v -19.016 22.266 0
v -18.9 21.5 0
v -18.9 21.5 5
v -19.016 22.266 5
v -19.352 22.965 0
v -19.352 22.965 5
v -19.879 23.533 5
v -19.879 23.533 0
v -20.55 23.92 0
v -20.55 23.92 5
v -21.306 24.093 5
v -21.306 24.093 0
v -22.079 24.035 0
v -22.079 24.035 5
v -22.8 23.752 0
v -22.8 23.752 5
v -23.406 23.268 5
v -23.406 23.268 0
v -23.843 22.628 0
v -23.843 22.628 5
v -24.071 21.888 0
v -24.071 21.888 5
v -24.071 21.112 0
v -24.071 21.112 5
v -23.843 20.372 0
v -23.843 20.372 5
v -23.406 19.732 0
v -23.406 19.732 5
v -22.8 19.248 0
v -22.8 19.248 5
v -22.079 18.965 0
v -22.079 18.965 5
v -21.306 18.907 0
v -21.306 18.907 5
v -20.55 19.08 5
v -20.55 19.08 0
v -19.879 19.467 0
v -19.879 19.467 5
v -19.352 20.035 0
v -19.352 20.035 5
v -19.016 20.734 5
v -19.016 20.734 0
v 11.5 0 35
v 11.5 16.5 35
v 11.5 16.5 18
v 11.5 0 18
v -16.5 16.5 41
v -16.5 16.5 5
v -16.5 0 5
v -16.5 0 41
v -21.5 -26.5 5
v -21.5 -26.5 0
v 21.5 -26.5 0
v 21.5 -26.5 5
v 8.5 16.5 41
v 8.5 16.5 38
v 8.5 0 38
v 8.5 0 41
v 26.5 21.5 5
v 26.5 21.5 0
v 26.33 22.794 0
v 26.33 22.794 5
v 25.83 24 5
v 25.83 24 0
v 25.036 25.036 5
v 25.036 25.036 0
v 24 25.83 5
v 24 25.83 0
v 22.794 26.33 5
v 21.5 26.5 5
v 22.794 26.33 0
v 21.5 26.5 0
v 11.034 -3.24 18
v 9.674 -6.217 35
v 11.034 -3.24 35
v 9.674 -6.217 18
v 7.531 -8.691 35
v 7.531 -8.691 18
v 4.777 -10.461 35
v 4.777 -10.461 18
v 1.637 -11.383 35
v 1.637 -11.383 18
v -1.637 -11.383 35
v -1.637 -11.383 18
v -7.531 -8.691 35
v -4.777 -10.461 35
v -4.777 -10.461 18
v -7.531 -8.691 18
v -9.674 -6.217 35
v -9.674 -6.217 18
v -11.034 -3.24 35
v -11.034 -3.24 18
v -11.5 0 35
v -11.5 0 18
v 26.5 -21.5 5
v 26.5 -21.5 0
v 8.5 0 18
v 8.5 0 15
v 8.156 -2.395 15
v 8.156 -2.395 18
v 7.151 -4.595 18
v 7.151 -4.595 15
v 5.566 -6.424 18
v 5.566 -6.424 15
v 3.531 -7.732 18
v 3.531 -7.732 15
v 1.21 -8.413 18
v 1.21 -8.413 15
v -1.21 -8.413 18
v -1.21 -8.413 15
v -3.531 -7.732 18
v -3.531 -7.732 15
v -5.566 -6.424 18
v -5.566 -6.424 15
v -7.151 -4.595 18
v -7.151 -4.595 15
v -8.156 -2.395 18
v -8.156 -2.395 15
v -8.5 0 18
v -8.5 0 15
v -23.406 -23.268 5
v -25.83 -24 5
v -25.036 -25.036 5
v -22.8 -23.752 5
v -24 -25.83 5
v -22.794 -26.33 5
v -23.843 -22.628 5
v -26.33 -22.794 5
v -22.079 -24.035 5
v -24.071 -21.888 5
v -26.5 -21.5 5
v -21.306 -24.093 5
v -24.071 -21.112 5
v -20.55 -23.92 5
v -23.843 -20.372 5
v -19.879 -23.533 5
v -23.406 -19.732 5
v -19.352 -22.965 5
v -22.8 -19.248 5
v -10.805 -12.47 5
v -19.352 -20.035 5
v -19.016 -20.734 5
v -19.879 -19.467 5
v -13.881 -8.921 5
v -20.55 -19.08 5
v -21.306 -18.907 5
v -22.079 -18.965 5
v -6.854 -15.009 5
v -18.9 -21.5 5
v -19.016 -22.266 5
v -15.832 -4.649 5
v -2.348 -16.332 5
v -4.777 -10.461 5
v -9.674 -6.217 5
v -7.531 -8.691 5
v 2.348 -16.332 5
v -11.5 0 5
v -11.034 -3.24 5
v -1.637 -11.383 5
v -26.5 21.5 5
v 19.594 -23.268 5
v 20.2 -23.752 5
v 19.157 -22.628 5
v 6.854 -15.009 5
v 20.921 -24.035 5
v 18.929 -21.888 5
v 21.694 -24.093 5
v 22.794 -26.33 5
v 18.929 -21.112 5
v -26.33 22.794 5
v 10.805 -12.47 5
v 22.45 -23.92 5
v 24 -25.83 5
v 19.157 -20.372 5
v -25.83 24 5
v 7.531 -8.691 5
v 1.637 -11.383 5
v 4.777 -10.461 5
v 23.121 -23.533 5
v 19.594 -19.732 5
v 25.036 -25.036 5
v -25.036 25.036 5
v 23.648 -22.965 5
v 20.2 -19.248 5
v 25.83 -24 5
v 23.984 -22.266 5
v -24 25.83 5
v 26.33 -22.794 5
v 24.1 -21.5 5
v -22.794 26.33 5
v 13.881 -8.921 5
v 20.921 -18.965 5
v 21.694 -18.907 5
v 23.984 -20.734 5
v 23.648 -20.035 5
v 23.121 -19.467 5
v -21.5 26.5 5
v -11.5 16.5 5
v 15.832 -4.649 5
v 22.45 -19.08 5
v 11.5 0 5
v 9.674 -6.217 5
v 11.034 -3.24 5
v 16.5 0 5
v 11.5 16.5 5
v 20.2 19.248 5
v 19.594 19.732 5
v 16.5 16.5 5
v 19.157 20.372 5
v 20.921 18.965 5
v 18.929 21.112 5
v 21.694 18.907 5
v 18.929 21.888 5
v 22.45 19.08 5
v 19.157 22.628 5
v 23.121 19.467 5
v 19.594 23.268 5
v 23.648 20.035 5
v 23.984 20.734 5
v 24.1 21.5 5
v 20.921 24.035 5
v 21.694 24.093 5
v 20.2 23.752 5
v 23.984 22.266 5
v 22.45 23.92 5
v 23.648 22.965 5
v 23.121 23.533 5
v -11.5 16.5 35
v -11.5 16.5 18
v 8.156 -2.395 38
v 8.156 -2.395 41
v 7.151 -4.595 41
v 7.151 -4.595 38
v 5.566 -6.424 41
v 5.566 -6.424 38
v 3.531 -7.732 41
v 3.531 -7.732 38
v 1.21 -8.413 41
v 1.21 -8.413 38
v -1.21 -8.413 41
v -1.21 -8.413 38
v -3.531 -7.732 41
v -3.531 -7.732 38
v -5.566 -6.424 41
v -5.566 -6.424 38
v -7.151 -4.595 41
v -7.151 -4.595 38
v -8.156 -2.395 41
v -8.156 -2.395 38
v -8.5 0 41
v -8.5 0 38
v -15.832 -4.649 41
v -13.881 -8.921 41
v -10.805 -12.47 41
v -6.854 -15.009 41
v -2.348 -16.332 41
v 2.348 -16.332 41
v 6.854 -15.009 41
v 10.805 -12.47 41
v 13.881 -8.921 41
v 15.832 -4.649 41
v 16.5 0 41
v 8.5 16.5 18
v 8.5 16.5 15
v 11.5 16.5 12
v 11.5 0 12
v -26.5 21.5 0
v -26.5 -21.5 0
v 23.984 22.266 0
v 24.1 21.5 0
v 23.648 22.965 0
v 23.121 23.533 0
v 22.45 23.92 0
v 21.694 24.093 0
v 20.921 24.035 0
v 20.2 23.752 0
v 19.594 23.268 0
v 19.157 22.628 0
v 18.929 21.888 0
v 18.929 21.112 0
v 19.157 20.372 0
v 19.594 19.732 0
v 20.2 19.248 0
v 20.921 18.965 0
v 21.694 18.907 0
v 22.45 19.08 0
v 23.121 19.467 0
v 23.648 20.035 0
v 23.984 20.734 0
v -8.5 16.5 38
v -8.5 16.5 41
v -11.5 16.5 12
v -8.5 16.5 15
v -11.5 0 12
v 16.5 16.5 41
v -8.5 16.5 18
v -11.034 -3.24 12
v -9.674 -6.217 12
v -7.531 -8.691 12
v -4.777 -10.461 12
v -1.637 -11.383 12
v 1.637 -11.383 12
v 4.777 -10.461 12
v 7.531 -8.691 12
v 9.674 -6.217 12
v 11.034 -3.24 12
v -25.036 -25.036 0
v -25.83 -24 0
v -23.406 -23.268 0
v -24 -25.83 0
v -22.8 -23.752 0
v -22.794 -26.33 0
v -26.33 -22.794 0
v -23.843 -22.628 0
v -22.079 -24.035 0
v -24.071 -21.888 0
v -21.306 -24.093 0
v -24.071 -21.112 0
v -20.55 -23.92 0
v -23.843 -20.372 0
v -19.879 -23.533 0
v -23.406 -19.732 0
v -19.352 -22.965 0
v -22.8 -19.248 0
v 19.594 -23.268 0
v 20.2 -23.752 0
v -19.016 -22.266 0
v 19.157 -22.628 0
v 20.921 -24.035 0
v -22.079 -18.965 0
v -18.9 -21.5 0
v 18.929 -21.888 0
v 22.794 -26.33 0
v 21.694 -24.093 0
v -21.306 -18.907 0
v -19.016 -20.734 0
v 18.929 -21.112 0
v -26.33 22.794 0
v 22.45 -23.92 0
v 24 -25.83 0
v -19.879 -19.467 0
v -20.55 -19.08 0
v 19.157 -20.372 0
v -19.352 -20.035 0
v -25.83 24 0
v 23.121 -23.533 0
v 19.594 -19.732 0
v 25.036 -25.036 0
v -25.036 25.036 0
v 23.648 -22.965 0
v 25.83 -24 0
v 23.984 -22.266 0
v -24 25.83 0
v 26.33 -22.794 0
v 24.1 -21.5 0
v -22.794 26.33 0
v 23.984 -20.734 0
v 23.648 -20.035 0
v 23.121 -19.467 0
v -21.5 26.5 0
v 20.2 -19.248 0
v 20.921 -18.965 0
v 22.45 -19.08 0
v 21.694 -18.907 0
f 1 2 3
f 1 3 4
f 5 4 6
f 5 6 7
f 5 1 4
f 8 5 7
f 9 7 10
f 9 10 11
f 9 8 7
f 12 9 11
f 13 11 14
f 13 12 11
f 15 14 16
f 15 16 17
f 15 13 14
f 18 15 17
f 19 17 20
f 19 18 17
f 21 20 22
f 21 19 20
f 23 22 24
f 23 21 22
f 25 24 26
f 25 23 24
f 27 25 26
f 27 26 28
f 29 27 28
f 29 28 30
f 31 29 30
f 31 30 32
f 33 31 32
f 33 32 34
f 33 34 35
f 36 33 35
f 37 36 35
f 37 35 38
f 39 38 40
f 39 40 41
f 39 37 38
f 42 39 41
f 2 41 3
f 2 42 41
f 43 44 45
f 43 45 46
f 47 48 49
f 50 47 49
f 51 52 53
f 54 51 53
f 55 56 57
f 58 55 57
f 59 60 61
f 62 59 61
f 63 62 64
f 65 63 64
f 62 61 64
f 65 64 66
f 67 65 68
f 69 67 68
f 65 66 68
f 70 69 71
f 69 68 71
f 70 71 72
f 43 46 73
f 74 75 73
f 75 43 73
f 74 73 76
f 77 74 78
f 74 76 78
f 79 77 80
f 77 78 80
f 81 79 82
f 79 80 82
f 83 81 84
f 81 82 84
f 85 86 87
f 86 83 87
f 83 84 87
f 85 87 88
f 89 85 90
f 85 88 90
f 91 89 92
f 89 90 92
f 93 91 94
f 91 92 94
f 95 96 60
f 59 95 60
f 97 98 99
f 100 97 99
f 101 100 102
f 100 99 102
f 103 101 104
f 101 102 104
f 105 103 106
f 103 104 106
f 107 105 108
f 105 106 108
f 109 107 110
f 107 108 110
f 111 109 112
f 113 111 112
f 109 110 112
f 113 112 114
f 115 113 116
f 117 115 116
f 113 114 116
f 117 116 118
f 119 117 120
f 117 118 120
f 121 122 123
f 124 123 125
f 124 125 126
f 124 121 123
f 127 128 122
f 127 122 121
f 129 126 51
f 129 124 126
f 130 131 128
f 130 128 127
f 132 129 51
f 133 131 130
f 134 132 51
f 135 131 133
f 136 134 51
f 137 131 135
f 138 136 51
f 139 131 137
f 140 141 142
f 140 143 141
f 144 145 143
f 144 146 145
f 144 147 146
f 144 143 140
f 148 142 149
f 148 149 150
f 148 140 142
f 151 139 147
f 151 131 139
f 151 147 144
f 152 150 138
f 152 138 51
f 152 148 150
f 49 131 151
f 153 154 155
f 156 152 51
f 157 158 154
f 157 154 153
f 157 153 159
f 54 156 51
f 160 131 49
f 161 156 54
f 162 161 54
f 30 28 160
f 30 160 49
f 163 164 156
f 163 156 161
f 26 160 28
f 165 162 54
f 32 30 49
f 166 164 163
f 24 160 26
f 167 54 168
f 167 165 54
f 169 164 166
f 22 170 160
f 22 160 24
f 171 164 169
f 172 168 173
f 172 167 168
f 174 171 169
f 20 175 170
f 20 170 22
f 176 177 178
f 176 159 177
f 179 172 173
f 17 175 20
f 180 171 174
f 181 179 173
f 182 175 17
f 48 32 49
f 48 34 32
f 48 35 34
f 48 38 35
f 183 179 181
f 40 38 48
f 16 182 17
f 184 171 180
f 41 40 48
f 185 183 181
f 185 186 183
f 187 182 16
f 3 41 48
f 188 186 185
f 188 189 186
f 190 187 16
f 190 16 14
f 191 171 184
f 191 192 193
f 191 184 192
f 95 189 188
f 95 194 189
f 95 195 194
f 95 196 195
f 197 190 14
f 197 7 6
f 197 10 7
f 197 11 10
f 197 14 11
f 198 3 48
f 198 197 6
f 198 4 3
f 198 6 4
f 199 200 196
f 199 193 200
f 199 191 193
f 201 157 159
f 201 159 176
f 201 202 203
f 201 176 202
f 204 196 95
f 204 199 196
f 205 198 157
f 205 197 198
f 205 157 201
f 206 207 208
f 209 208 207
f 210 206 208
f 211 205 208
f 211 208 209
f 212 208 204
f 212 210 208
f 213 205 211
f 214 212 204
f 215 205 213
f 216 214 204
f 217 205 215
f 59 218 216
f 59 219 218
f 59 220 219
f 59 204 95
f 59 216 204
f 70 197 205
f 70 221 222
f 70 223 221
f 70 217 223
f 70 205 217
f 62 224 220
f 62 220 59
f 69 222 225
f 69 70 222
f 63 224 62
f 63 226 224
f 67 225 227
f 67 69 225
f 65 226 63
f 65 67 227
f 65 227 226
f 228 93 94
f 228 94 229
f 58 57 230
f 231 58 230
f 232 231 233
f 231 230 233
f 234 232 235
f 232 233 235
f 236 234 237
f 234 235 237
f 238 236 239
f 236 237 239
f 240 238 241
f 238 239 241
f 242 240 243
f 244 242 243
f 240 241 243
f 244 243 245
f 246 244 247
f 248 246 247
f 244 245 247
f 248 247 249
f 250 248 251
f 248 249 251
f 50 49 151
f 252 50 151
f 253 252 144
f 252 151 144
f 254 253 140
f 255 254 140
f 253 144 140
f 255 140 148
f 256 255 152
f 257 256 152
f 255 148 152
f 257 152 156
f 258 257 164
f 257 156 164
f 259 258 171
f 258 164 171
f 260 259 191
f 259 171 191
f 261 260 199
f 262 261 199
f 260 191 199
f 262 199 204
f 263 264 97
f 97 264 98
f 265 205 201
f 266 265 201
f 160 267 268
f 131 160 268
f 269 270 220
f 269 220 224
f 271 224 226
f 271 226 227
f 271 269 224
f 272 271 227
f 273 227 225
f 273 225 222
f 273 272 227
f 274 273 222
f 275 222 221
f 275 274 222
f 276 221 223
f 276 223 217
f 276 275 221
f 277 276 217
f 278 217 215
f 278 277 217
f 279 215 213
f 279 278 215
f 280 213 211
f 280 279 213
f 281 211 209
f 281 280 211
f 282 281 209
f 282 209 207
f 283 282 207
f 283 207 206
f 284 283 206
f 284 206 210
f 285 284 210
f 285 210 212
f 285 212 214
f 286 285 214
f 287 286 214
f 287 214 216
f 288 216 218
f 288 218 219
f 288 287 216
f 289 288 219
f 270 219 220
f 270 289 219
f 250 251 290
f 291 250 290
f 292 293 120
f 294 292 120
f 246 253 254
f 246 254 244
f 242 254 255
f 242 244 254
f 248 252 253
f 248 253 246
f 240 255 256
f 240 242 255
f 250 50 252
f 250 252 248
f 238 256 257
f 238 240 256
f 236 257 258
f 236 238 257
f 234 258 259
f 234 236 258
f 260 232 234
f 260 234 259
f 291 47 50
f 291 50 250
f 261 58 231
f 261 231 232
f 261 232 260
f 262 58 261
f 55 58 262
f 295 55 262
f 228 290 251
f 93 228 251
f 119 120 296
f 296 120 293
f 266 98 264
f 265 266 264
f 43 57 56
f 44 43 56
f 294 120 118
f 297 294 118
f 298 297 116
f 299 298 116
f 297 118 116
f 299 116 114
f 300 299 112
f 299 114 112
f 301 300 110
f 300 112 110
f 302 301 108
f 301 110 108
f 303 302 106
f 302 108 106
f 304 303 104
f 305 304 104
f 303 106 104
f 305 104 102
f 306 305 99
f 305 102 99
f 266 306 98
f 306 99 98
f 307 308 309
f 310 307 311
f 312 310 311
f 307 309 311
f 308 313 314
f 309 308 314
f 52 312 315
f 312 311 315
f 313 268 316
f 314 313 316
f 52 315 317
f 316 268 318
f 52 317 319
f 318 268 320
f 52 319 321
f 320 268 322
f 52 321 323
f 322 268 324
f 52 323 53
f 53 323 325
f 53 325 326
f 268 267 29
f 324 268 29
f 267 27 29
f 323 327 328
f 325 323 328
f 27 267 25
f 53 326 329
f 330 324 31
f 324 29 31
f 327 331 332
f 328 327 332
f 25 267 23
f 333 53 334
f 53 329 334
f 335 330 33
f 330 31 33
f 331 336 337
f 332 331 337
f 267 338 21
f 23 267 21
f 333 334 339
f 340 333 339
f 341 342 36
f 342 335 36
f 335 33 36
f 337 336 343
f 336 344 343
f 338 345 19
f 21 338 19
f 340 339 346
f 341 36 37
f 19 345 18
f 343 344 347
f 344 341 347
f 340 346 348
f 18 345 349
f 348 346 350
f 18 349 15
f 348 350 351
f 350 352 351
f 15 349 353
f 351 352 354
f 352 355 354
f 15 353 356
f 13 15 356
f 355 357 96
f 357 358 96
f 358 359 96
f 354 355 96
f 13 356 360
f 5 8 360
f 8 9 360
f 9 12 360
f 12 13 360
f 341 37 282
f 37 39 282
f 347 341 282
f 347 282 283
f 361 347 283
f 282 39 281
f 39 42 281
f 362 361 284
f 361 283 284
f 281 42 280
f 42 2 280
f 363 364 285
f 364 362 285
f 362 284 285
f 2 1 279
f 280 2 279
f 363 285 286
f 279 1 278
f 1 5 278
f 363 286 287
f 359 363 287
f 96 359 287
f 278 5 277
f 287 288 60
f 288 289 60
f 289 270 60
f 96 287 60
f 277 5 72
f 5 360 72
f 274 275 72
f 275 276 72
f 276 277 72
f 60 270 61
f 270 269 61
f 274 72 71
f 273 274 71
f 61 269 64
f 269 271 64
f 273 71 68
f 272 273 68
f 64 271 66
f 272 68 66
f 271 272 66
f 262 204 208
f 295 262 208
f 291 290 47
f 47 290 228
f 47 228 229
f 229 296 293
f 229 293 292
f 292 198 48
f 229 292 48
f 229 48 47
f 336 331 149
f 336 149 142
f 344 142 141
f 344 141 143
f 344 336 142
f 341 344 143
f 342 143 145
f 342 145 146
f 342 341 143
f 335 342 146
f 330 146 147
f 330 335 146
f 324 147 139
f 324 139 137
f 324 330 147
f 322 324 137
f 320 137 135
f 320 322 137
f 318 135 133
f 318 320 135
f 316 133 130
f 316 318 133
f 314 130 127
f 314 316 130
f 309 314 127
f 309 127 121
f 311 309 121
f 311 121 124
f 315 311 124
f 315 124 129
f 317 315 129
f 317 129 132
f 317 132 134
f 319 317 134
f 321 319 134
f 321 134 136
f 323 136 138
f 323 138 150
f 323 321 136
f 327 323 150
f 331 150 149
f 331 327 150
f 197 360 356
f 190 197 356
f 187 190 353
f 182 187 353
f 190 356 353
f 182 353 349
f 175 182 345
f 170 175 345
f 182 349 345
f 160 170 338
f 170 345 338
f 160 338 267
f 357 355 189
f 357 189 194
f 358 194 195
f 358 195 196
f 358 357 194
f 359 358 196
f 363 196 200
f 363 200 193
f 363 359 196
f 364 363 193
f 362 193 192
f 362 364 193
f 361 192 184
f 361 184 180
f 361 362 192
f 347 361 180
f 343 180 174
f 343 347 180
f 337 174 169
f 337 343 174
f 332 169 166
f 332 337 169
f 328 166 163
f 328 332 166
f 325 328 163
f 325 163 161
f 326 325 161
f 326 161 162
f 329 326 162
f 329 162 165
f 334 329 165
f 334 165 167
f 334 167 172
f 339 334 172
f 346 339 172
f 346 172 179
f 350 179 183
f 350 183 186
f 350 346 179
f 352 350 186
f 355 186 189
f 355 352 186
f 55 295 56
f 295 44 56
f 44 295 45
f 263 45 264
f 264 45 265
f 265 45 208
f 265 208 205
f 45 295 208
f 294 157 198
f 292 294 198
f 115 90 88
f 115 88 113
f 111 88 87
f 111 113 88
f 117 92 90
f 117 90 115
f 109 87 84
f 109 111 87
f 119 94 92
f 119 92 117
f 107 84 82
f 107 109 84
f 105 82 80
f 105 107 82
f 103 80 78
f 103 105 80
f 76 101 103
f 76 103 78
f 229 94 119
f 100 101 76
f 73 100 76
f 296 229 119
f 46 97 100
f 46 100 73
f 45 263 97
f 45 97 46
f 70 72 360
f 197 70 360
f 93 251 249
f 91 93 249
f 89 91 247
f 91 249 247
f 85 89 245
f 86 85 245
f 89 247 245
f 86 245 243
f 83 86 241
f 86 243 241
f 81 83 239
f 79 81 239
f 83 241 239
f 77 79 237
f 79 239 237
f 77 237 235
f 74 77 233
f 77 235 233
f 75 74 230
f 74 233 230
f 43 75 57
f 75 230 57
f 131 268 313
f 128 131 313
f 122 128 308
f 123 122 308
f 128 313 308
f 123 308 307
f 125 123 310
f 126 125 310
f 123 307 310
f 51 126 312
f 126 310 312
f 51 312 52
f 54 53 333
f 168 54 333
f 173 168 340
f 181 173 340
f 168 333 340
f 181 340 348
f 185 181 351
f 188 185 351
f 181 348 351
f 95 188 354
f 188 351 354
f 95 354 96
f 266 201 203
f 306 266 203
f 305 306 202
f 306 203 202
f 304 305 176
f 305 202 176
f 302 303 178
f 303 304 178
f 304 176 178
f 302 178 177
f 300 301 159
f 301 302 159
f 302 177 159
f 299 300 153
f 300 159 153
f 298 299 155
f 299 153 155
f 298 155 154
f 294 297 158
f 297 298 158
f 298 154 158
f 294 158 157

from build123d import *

# Parameters (mm, degrees)
F0_R     = 2.6
F1_DEPTH = 5
F3_DEPTH = 36
F6_DEPTH = 3
F9_DEPTH = 3
F10_SIZE = 2.99999


# Not quite as in the source:
# - a fillet or chamfer is up to 0.001 mm smaller than in the source, because OpenCascade refuses the exact size


with BuildPart() as f1:
    # F0 (on Top) → F1 (new body)
    with BuildSketch(Plane.XY):
        with BuildLine():
            Line((21.5, 26.5), (-21.5, 26.5))
            ThreePointArc((-21.5, 26.5), (-17.9644660941, 25.0355339059), (-16.5, 21.5))
            ThreePointArc((-16.5, 21.5), (-21.5, 16.5), (-26.5, 21.5))
            Line((-26.5, 21.5), (-26.5, -21.5))
            ThreePointArc((-26.5, -21.5), (-21.5, -16.5), (-16.5, -21.5))
            ThreePointArc((-16.5, -21.5), (-17.9644660941, -25.0355339059), (-21.5, -26.5))
            Line((-21.5, -26.5), (21.5, -26.5))
            ThreePointArc((21.5, -26.5), (17.9644660941, -17.9644660941), (26.5, -21.5))
            Line((26.5, -21.5), (26.5, 21.5))
            ThreePointArc((26.5, 21.5), (17.9644660941, 17.9644660941), (21.5, 26.5))
        make_face()
        with BuildLine():
            Line((-11.5, 16.5), (-11.5, 0))
            ThreePointArc((-11.5, 0), (0, -11.5), (11.5, 0))
            Line((11.5, 0), (11.5, 16.5))
            Line((11.5, 16.5), (16.5, 16.5))
            Line((16.5, 16.5), (16.5, 0))
            ThreePointArc((16.5, 0), (0, -16.5), (-16.5, 0))
            Line((-16.5, 0), (-16.5, 16.5))
            Line((-16.5, 16.5), (-11.5, 16.5))
        make_face(mode=Mode.SUBTRACT)
        with BuildLine():
            ThreePointArc((11.5, 0), (0, -11.5), (-11.5, 0))
            Line((-11.5, 0), (-11.5, 16.5))
            Line((-11.5, 16.5), (-16.5, 16.5))
            Line((-16.5, 16.5), (-16.5, 0))
            ThreePointArc((-16.5, 0), (0, -16.5), (16.5, 0))
            Line((16.5, 0), (16.5, 16.5))
            Line((16.5, 16.5), (11.5, 16.5))
            Line((11.5, 16.5), (11.5, 0))
        make_face()
        with BuildLine():
            ThreePointArc((-16.5, 21.5), (-17.9644660941, 25.0355339059), (-21.5, 26.5))
            ThreePointArc((-21.5, 26.5), (-25.0355339059, 25.0355339059), (-26.5, 21.5))
            ThreePointArc((-26.5, 21.5), (-21.5, 16.5), (-16.5, 21.5))
        make_face()
        with Locations((-21.5, 21.5)):
            Circle(F0_R, mode=Mode.SUBTRACT)
        with BuildLine():
            ThreePointArc((-16.5, -21.5), (-21.5, -16.5), (-26.5, -21.5))
            ThreePointArc((-26.5, -21.5), (-25.0355339059, -25.0355339059), (-21.5, -26.5))
            ThreePointArc((-21.5, -26.5), (-17.9644660941, -25.0355339059), (-16.5, -21.5))
        make_face()
        with Locations((-21.5, -21.5)):
            Circle(F0_R, mode=Mode.SUBTRACT)
        with BuildLine():
            ThreePointArc((21.5, -26.5), (25.0355339059, -25.0355339059), (26.5, -21.5))
            ThreePointArc((26.5, -21.5), (17.9644660941, -17.9644660941), (21.5, -26.5))
        make_face()
        with Locations((21.5, -21.5)):
            Circle(F0_R, mode=Mode.SUBTRACT)
        with BuildLine():
            ThreePointArc((26.5, 21.5), (25.0355339059, 25.0355339059), (21.5, 26.5))
            ThreePointArc((21.5, 26.5), (17.9644660941, 17.9644660941), (26.5, 21.5))
        make_face()
        with Locations((21.5, 21.5)):
            Circle(F0_R, mode=Mode.SUBTRACT)
    extrude(amount=F1_DEPTH)

    # F2 (on face) → F3 (join)
    with BuildSketch(Plane.XY.offset(5)):
        with BuildLine():
            ThreePointArc((11.5, 0), (0, -11.5), (-11.5, 0))
            Line((-11.5, 0), (-11.5, 16.5))
            Line((-11.5, 16.5), (-16.5, 16.5))
            Line((-16.5, 16.5), (-16.5, 0))
            ThreePointArc((-16.5, 0), (0, -16.5), (16.5, 0))
            Line((16.5, 0), (16.5, 16.5))
            Line((16.5, 16.5), (11.5, 16.5))
            Line((11.5, 16.5), (11.5, 0))
        make_face()
    extrude(amount=F3_DEPTH)

    # F5 (on offset) → F6 (join)
    with BuildSketch(Plane.XY.offset(15)):
        with BuildLine():
            Line((-11.5, 16.5), (-11.5, 0))
            ThreePointArc((-11.5, 0), (0, -11.5), (11.5, 0))
            Line((11.5, 0), (11.5, 16.5))
            Line((11.5, 16.5), (8.5, 16.5))
            Line((8.5, 16.5), (8.5, 0))
            ThreePointArc((8.5, 0), (0, -8.5), (-8.5, 0))
            Line((-8.5, 0), (-8.5, 16.5))
            Line((-8.5, 16.5), (-11.5, 16.5))
        make_face()
    extrude(amount=F6_DEPTH)

    # F8 (on offset) → F9 (join)
    with BuildSketch(Plane.XY.offset(38)):
        with BuildLine():
            Line((-11.5, 16.5), (-11.5, 0))
            ThreePointArc((-11.5, 0), (0, -11.5), (11.5, 0))
            Line((11.5, 0), (11.5, 16.5))
            Line((11.5, 16.5), (8.5, 16.5))
            Line((8.5, 16.5), (8.5, 0))
            ThreePointArc((8.5, 0), (0, -8.5), (-8.5, 0))
            Line((-8.5, 0), (-8.5, 16.5))
            Line((-8.5, 16.5), (-11.5, 16.5))
        make_face()
    extrude(amount=F9_DEPTH)

    # F10 (size 3 in the source; OpenCascade refuses exactly that, so slightly less here)
    f10_edges = [f1.edges().sort_by_distance(p)[0] for p in [
        (-11.5, 8.25, 38),
        (-11.5, 8.25, 15),
    ]]
    chamfer(f10_edges, length=F10_SIZE)


solid = f1.part
